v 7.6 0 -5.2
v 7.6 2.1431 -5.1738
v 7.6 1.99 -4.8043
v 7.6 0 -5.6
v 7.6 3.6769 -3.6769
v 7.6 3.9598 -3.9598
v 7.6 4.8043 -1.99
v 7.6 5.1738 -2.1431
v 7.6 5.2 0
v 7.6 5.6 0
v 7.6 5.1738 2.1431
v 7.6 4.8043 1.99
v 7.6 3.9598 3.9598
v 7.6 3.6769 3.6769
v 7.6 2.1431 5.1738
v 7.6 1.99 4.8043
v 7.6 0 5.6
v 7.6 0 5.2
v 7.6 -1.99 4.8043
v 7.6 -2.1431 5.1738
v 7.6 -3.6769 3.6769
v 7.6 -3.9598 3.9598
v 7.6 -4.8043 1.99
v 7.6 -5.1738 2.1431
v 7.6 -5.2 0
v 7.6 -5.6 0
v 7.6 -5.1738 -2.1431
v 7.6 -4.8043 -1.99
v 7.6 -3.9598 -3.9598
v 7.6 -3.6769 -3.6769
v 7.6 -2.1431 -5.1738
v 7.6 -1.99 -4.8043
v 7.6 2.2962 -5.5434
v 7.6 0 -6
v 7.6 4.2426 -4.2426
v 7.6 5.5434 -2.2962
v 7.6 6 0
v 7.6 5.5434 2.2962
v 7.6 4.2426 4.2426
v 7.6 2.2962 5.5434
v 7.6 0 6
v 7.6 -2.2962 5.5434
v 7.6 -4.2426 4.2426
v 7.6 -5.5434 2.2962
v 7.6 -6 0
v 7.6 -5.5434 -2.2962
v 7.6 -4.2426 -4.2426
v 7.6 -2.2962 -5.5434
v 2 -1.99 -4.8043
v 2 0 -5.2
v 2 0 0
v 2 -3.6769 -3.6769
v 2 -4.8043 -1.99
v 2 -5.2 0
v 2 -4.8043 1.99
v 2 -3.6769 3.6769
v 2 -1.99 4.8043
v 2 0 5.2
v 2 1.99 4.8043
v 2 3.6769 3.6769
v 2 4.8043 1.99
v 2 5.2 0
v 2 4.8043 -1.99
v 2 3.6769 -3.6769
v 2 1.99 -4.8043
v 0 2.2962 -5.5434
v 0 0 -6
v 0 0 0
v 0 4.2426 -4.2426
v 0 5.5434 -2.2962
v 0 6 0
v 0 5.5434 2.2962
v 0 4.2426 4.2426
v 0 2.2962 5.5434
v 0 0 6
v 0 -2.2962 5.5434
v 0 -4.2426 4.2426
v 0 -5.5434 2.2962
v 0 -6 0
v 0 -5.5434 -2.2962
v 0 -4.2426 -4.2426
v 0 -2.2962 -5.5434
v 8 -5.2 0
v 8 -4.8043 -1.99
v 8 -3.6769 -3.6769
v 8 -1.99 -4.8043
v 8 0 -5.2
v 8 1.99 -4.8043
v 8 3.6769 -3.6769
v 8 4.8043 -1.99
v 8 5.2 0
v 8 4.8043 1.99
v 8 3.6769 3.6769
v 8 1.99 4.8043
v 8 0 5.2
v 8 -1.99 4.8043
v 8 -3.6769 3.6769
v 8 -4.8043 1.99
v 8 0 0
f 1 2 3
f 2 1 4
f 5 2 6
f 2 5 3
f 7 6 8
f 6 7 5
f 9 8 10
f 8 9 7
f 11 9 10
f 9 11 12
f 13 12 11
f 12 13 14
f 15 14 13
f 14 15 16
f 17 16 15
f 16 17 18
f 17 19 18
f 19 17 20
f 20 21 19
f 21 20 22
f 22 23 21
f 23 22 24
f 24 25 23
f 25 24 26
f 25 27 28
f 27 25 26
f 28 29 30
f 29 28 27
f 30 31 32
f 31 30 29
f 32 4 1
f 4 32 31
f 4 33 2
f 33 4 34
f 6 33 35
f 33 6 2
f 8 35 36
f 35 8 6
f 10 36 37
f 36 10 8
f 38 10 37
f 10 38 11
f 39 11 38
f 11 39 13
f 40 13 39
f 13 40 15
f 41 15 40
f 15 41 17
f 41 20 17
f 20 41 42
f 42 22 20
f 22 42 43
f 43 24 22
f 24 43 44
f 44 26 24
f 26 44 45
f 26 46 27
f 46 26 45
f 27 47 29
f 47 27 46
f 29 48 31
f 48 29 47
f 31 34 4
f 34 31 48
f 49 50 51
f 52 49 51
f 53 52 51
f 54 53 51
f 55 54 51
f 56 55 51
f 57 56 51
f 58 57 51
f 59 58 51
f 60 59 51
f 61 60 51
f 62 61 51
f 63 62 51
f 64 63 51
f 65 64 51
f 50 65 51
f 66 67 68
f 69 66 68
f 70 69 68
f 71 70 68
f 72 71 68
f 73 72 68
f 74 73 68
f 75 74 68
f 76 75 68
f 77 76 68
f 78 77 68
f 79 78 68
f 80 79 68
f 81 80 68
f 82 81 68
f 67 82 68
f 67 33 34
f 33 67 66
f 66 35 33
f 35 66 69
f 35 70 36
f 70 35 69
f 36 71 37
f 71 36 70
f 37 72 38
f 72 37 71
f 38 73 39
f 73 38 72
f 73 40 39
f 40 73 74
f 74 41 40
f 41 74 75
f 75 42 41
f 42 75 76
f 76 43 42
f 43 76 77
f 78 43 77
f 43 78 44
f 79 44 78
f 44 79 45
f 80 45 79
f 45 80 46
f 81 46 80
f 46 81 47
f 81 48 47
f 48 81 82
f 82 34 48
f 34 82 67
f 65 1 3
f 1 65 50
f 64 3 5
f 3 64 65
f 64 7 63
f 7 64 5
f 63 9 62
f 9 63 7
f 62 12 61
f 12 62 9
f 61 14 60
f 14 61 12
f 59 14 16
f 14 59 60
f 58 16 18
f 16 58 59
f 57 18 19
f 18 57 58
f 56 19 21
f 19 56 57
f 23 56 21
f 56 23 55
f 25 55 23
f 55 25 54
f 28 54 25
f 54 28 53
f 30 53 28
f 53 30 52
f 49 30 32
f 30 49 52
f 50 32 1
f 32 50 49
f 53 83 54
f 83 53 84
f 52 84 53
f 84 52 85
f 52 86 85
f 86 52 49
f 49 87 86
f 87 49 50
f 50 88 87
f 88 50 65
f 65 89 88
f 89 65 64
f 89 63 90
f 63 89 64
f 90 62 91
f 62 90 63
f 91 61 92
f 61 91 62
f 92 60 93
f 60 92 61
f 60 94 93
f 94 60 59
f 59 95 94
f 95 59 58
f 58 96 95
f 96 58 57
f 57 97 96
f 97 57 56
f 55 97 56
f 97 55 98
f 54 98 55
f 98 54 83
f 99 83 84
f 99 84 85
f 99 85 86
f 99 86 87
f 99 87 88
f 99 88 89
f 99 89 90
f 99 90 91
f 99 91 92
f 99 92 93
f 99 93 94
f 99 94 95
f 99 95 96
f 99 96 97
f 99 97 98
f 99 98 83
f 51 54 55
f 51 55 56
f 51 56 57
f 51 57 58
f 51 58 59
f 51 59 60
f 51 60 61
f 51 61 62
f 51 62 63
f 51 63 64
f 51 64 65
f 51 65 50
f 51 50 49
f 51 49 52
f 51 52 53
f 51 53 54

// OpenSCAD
// file: ../u9044.scad
use <../lib.scad>
use <../p/4-4cyli.scad>
use <../p/4-4disc.scad>
use <../p/4-4edge.scad>
function ldraw_lib__u9044() = [
// 0 ~Magnet Cylindrical  1.3 x  1.3
// 0 Name: u9044.dat
// 0 Author: Chris Dee [cwdee]
// 0 !LDRAW_ORG Part UPDATE 2012-01
// 0 !LICENSE Licensed under CC BY 2.0 and CC BY 4.0 : see CAreadme.txt
// 
// 0 BFC CERTIFY CW
  [0,"BFC","CERTIFY"],
  [0,"BFC","CW"],
// 
// 0 !CMDLINE -c493
// 
// 0 !HISTORY 2011-12-18 [Steffen] added cmdline for new magnet material 493
// 0 !HISTORY 2012-03-30 [PTadmin] Official Update 2012-01
// 
// 
// 1 16 0 0 -7.5 13 0 0 0 0 13 0 15 0 4-4cyli.dat
  [1,16,0,0,-7.5,13,0,0,0,0,13,0,15,0, ldraw_lib__4_4cyli()],
// 1 16 0 0 7.5 13 0 0 0 0 13 0 1 0 4-4edge.dat
  [1,16,0,0,7.5,13,0,0,0,0,13,0,1,0, ldraw_lib__4_4edge()],
// 1 16 0 0 7.5 13 0 0 0 0 13 0 -1 0 4-4disc.dat
  [1,16,0,0,7.5,13,0,0,0,0,13,0,-1,0, ldraw_lib__4_4disc()],
// 1 16 0 0 -7.5 13 0 0 0 0 -13 0 1 0 4-4edge.dat
  [1,16,0,0,-7.5,13,0,0,0,0,-13,0,1,0, ldraw_lib__4_4edge()],
// 1 16 0 0 -7.5 13 0 0 0 0 -13 0 1 0 4-4disc.dat
  [1,16,0,0,-7.5,13,0,0,0,0,-13,0,1,0, ldraw_lib__4_4disc()],
];
makepoly(ldraw_lib__u9044(), line=0.2);
// file: ../../p/4-4rin14.scad
use <../lib.scad>
function ldraw_lib__4_4rin14() = [
// 0 Ring 14 x 1.0
// 0 Name: 4-4rin14.dat
// 0 Author: John Riley [jriley]
// 0 !LDRAW_ORG Primitive UPDATE 2003-03
// 0 !LICENSE Licensed under CC BY 2.0 and CC BY 4.0 : see CAreadme.txt
// 
// 0 BFC CERTIFY CCW
  [0,"BFC","CERTIFY"],
  [0,"BFC","CCW"],
// 
// 0 !HISTORY 2003-12-19 [PTadmin] Official Update 2003-03
// 0 !HISTORY 2007-06-24 [PTadmin] Header formatted for Contributor Agreement
// 0 !HISTORY 2008-07-01 [PTadmin] Official Update 2008-01
// 
// 
// 4 16 14 0 0 15 0 0 13.8585 0 5.7405 12.9346 0 5.3578
  [4,16,14,0,0,15,0,0,13.8585,0,5.7405,12.9346,0,5.3578],
// 4 16 12.9346 0 5.3578 13.8585 0 5.7405 10.6065 0 10.6065 9.8994 0 9.8994
  [4,16,12.9346,0,5.3578,13.8585,0,5.7405,10.6065,0,10.6065,9.8994,0,9.8994],
// 4 16 9.8994 0 9.8994 10.6065 0 10.6065 5.7405 0 13.8585 5.3578 0 12.9346
  [4,16,9.8994,0,9.8994,10.6065,0,10.6065,5.7405,0,13.8585,5.3578,0,12.9346],
// 4 16 5.3578 0 12.9346 5.7405 0 13.8585 0 0 15 0 0 14
  [4,16,5.3578,0,12.9346,5.7405,0,13.8585,0,0,15,0,0,14],
// 4 16 0 0 14 0 0 15 -5.7405 0 13.8585 -5.3578 0 12.9346
  [4,16,0,0,14,0,0,15,-5.7405,0,13.8585,-5.3578,0,12.9346],
// 4 16 -5.3578 0 12.9346 -5.7405 0 13.8585 -10.6065 0 10.6065 -9.8994 0 9.8994
  [4,16,-5.3578,0,12.9346,-5.7405,0,13.8585,-10.6065,0,10.6065,-9.8994,0,9.8994],
// 4 16 -9.8994 0 9.8994 -10.6065 0 10.6065 -13.8585 0 5.7405 -12.9346 0 5.3578
  [4,16,-9.8994,0,9.8994,-10.6065,0,10.6065,-13.8585,0,5.7405,-12.9346,0,5.3578],
// 4 16 -12.9346 0 5.3578 -13.8585 0 5.7405 -15 0 0 -14 0 0
  [4,16,-12.9346,0,5.3578,-13.8585,0,5.7405,-15,0,0,-14,0,0],
// 4 16 -14 0 0 -15 0 0 -13.8585 0 -5.7405 -12.9346 0 -5.3578
  [4,16,-14,0,0,-15,0,0,-13.8585,0,-5.7405,-12.9346,0,-5.3578],
// 4 16 -12.9346 0 -5.3578 -13.8585 0 -5.7405 -10.6065 0 -10.6065 -9.8994 0 -9.8994
  [4,16,-12.9346,0,-5.3578,-13.8585,0,-5.7405,-10.6065,0,-10.6065,-9.8994,0,-9.8994],
// 4 16 -9.8994 0 -9.8994 -10.6065 0 -10.6065 -5.7405 0 -13.8585 -5.3578 0 -12.9346
  [4,16,-9.8994,0,-9.8994,-10.6065,0,-10.6065,-5.7405,0,-13.8585,-5.3578,0,-12.9346],
// 4 16 -5.3578 0 -12.9346 -5.7405 0 -13.8585 0 0 -15 0 0 -14
  [4,16,-5.3578,0,-12.9346,-5.7405,0,-13.8585,0,0,-15,0,0,-14],
// 4 16 0 0 -14 0 0 -15 5.7405 0 -13.8585 5.3578 0 -12.9346
  [4,16,0,0,-14,0,0,-15,5.7405,0,-13.8585,5.3578,0,-12.9346],
// 4 16 5.3578 0 -12.9346 5.7405 0 -13.8585 10.6065 0 -10.6065 9.8994 0 -9.8994
  [4,16,5.3578,0,-12.9346,5.7405,0,-13.8585,10.6065,0,-10.6065,9.8994,0,-9.8994],
// 4 16 9.8994 0 -9.8994 10.6065 0 -10.6065 13.8585 0 -5.7405 12.9346 0 -5.3578
  [4,16,9.8994,0,-9.8994,10.6065,0,-10.6065,13.8585,0,-5.7405,12.9346,0,-5.3578],
// 4 16 12.9346 0 -5.3578 13.8585 0 -5.7405 15 0 0 14 0 0
  [4,16,12.9346,0,-5.3578,13.8585,0,-5.7405,15,0,0,14,0,0],
// 0
// 
];
makepoly(ldraw_lib__4_4rin14(), line=0.2);
// file: ../../p/4-4rin13.scad
use <../lib.scad>
function ldraw_lib__4_4rin13() = [
// 0 Ring 13 x 1.0
// 0 Name: 4-4rin13.dat
// 0 Author: John Riley [jriley]
// 0 !LDRAW_ORG Primitive UPDATE 2003-03
// 0 !LICENSE Licensed under CC BY 2.0 and CC BY 4.0 : see CAreadme.txt
// 
// 0 BFC CERTIFY CCW
  [0,"BFC","CERTIFY"],
  [0,"BFC","CCW"],
// 
// 0 !HISTORY 2003-12-19 [PTadmin] Official Update 2003-03
// 0 !HISTORY 2007-06-24 [PTadmin] Header formatted for Contributor Agreement
// 0 !HISTORY 2008-07-01 [PTadmin] Official Update 2008-01
// 
// 
// 4 16 13 0 0 14 0 0 12.9346 0 5.3578 12.0107 0 4.9751
  [4,16,13,0,0,14,0,0,12.9346,0,5.3578,12.0107,0,4.9751],
// 4 16 12.0107 0 4.9751 12.9346 0 5.3578 9.8994 0 9.8994 9.1923 0 9.1923
  [4,16,12.0107,0,4.9751,12.9346,0,5.3578,9.8994,0,9.8994,9.1923,0,9.1923],
// 4 16 9.1923 0 9.1923 9.8994 0 9.8994 5.3578 0 12.9346 4.9751 0 12.0107
  [4,16,9.1923,0,9.1923,9.8994,0,9.8994,5.3578,0,12.9346,4.9751,0,12.0107],
// 4 16 4.9751 0 12.0107 5.3578 0 12.9346 0 0 14 0 0 13
  [4,16,4.9751,0,12.0107,5.3578,0,12.9346,0,0,14,0,0,13],
// 4 16 0 0 13 0 0 14 -5.3578 0 12.9346 -4.9751 0 12.0107
  [4,16,0,0,13,0,0,14,-5.3578,0,12.9346,-4.9751,0,12.0107],
// 4 16 -4.9751 0 12.0107 -5.3578 0 12.9346 -9.8994 0 9.8994 -9.1923 0 9.1923
  [4,16,-4.9751,0,12.0107,-5.3578,0,12.9346,-9.8994,0,9.8994,-9.1923,0,9.1923],
// 4 16 -9.1923 0 9.1923 -9.8994 0 9.8994 -12.9346 0 5.3578 -12.0107 0 4.9751
  [4,16,-9.1923,0,9.1923,-9.8994,0,9.8994,-12.9346,0,5.3578,-12.0107,0,4.9751],
// 4 16 -12.0107 0 4.9751 -12.9346 0 5.3578 -14 0 0 -13 0 0
  [4,16,-12.0107,0,4.9751,-12.9346,0,5.3578,-14,0,0,-13,0,0],
// 4 16 -13 0 0 -14 0 0 -12.9346 0 -5.3578 -12.0107 0 -4.9751
  [4,16,-13,0,0,-14,0,0,-12.9346,0,-5.3578,-12.0107,0,-4.9751],
// 4 16 -12.0107 0 -4.9751 -12.9346 0 -5.3578 -9.8994 0 -9.8994 -9.1923 0 -9.1923
  [4,16,-12.0107,0,-4.9751,-12.9346,0,-5.3578,-9.8994,0,-9.8994,-9.1923,0,-9.1923],
// 4 16 -9.1923 0 -9.1923 -9.8994 0 -9.8994 -5.3578 0 -12.9346 -4.9751 0 -12.0107
  [4,16,-9.1923,0,-9.1923,-9.8994,0,-9.8994,-5.3578,0,-12.9346,-4.9751,0,-12.0107],
// 4 16 -4.9751 0 -12.0107 -5.3578 0 -12.9346 0 0 -14 0 0 -13
  [4,16,-4.9751,0,-12.0107,-5.3578,0,-12.9346,0,0,-14,0,0,-13],
// 4 16 0 0 -13 0 0 -14 5.3578 0 -12.9346 4.9751 0 -12.0107
  [4,16,0,0,-13,0,0,-14,5.3578,0,-12.9346,4.9751,0,-12.0107],
// 4 16 4.9751 0 -12.0107 5.3578 0 -12.9346 9.8994 0 -9.8994 9.1923 0 -9.1923
  [4,16,4.9751,0,-12.0107,5.3578,0,-12.9346,9.8994,0,-9.8994,9.1923,0,-9.1923],
// 4 16 9.1923 0 -9.1923 9.8994 0 -9.8994 12.9346 0 -5.3578 12.0107 0 -4.9751
  [4,16,9.1923,0,-9.1923,9.8994,0,-9.8994,12.9346,0,-5.3578,12.0107,0,-4.9751],
// 4 16 12.0107 0 -4.9751 12.9346 0 -5.3578 14 0 0 13 0 0
  [4,16,12.0107,0,-4.9751,12.9346,0,-5.3578,14,0,0,13,0,0],
// 0
// 
];
makepoly(ldraw_lib__4_4rin13(), line=0.2);
// file: ../../p/4-4edge.scad
use <../lib.scad>
function ldraw_lib__4_4edge() = [
// 0 Circle 1.0
// 0 Name: 4-4edge.dat
// 0 Author: James Jessiman
// 0 !LDRAW_ORG Primitive UPDATE 2017-01
// 0 !LICENSE Licensed under CC BY 2.0 and CC BY 4.0 : see CAreadme.txt
// 
// 0 BFC CERTIFY CCW
  [0,"BFC","CERTIFY"],
  [0,"BFC","CCW"],
// 
// 0 !HISTORY 1998-12-15 [PTadmin] Official Update 1998-10
// 0 !HISTORY 2005-12-28 [PTadmin] Official Update 2005-01
// 0 !HISTORY 2007-06-24 [PTadmin] Header formatted for Contributor Agreement
// 0 !HISTORY 2008-07-01 [PTadmin] Official Update 2008-01
// 0 !HISTORY 2017-01-15 [Steffen] BFCed
// 0 !HISTORY 2017-12-30 [PTadmin] Official Update 2017-01
// 
// 
// 2 24 1 0 0 0.9239 0 0.3827
  [2,24,1,0,0,0.9239,0,0.3827],
// 2 24 0.9239 0 0.3827 0.7071 0 0.7071
  [2,24,0.9239,0,0.3827,0.7071,0,0.7071],
// 2 24 0.7071 0 0.7071 0.3827 0 0.9239
  [2,24,0.7071,0,0.7071,0.3827,0,0.9239],
// 2 24 0.3827 0 0.9239 0 0 1
  [2,24,0.3827,0,0.9239,0,0,1],
// 2 24 0 0 1 -0.3827 0 0.9239
  [2,24,0,0,1,-0.3827,0,0.9239],
// 2 24 -0.3827 0 0.9239 -0.7071 0 0.7071
  [2,24,-0.3827,0,0.9239,-0.7071,0,0.7071],
// 2 24 -0.7071 0 0.7071 -0.9239 0 0.3827
  [2,24,-0.7071,0,0.7071,-0.9239,0,0.3827],
// 2 24 -0.9239 0 0.3827 -1 0 -0
  [2,24,-0.9239,0,0.3827,-1,0,-0],
// 2 24 -1 0 -0 -0.9239 0 -0.3827
  [2,24,-1,0,-0,-0.9239,0,-0.3827],
// 2 24 -0.9239 0 -0.3827 -0.7071 0 -0.7071
  [2,24,-0.9239,0,-0.3827,-0.7071,0,-0.7071],
// 2 24 -0.7071 0 -0.7071 -0.3827 0 -0.9239
  [2,24,-0.7071,0,-0.7071,-0.3827,0,-0.9239],
// 2 24 -0.3827 0 -0.9239 0 0 -1
  [2,24,-0.3827,0,-0.9239,0,0,-1],
// 2 24 0 0 -1 0.3827 0 -0.9239
  [2,24,0,0,-1,0.3827,0,-0.9239],
// 2 24 0.3827 0 -0.9239 0.7071 0 -0.7071
  [2,24,0.3827,0,-0.9239,0.7071,0,-0.7071],
// 2 24 0.7071 0 -0.7071 0.9239 0 -0.3827
  [2,24,0.7071,0,-0.7071,0.9239,0,-0.3827],
// 2 24 0.9239 0 -0.3827 1 0 0
  [2,24,0.9239,0,-0.3827,1,0,0],
];
makepoly(ldraw_lib__4_4edge(), line=0.2);
// file: ../../p/4-4disc.scad
use <../lib.scad>
function ldraw_lib__4_4disc() = [
// 0 Disc 1.0
// 0 Name: 4-4disc.dat
// 0 Author: James Jessiman
// 0 !LDRAW_ORG Primitive UPDATE 2002-02
// 0 !LICENSE Licensed under CC BY 2.0 and CC BY 4.0 : see CAreadme.txt
// 
// 0 BFC CERTIFY CCW
  [0,"BFC","CERTIFY"],
  [0,"BFC","CCW"],
// 
// 0 !HISTORY 1998-12-15 [PTadmin] Official Update 1998-10
// 0 !HISTORY 2002-03-23 [sbliss] Added BFC statement
// 0 !HISTORY 2002-04-25 [PTadmin] Official Update 2002-02
// 0 !HISTORY 2007-06-24 [PTadmin] Header formatted for Contributor Agreement
// 0 !HISTORY 2008-07-01 [PTadmin] Official Update 2008-01
// 
// 
// 3 16 0 0 0 1 0 0 0.9239 0 0.3827
  [3,16,0,0,0,1,0,0,0.9239,0,0.3827],
// 3 16 0 0 0 0.9239 0 0.3827 0.7071 0 0.7071
  [3,16,0,0,0,0.9239,0,0.3827,0.7071,0,0.7071],
// 3 16 0 0 0 0.7071 0 0.7071 0.3827 0 0.9239
  [3,16,0,0,0,0.7071,0,0.7071,0.3827,0,0.9239],
// 3 16 0 0 0 0.3827 0 0.9239 0 0 1
  [3,16,0,0,0,0.3827,0,0.9239,0,0,1],
// 3 16 0 0 0 0 0 1 -0.3827 0 0.9239
  [3,16,0,0,0,0,0,1,-0.3827,0,0.9239],
// 3 16 0 0 0 -0.3827 0 0.9239 -0.7071 0 0.7071
  [3,16,0,0,0,-0.3827,0,0.9239,-0.7071,0,0.7071],
// 3 16 0 0 0 -0.7071 0 0.7071 -0.9239 0 0.3827
  [3,16,0,0,0,-0.7071,0,0.7071,-0.9239,0,0.3827],
// 3 16 0 0 0 -0.9239 0 0.3827 -1 0 -0
  [3,16,0,0,0,-0.9239,0,0.3827,-1,0,-0],
// 3 16 0 0 0 -1 0 -0 -0.9239 0 -0.3827
  [3,16,0,0,0,-1,0,-0,-0.9239,0,-0.3827],
// 3 16 0 0 0 -0.9239 0 -0.3827 -0.7071 0 -0.7071
  [3,16,0,0,0,-0.9239,0,-0.3827,-0.7071,0,-0.7071],
// 3 16 0 0 0 -0.7071 0 -0.7071 -0.3827 0 -0.9239
  [3,16,0,0,0,-0.7071,0,-0.7071,-0.3827,0,-0.9239],
// 3 16 0 0 0 -0.3827 0 -0.9239 0 0 -1
  [3,16,0,0,0,-0.3827,0,-0.9239,0,0,-1],
// 3 16 0 0 0 0 0 -1 0.3827 0 -0.9239
  [3,16,0,0,0,0,0,-1,0.3827,0,-0.9239],
// 3 16 0 0 0 0.3827 0 -0.9239 0.7071 0 -0.7071
  [3,16,0,0,0,0.3827,0,-0.9239,0.7071,0,-0.7071],
// 3 16 0 0 0 0.7071 0 -0.7071 0.9239 0 -0.3827
  [3,16,0,0,0,0.7071,0,-0.7071,0.9239,0,-0.3827],
// 3 16 0 0 0 0.9239 0 -0.3827 1 0 0
  [3,16,0,0,0,0.9239,0,-0.3827,1,0,0],
// 0
];
makepoly(ldraw_lib__4_4disc(), line=0.2);
// file: ../../p/4-4cyli.scad
use <../lib.scad>
function ldraw_lib__4_4cyli() = [
// 0 Cylinder 1.0
// 0 Name: 4-4cyli.dat
// 0 Author: James Jessiman
// 0 !LDRAW_ORG Primitive UPDATE 2005-01
// 0 !LICENSE Licensed under CC BY 2.0 and CC BY 4.0 : see CAreadme.txt
// 
// 0 BFC CERTIFY CCW
  [0,"BFC","CERTIFY"],
  [0,"BFC","CCW"],
// 
// 0 !HISTORY 1998-12-15 [PTadmin] Official Update 1998-10
// 0 !HISTORY 2002-03-23 [sbliss] Added BFC statement; merged headers from files in distributions LDraw 0.27 and Complete.
// 0 !HISTORY 2002-04-25 [PTadmin] Official Update 2002-02
// 0 !HISTORY 2004-12-14 [guyvivan] BFC CCW
// 0 !HISTORY 2005-12-28 [PTadmin] Official Update 2005-01
// 0 !HISTORY 2007-06-24 [PTadmin] Header formatted for Contributor Agreement
// 0 !HISTORY 2008-07-01 [PTadmin] Official Update 2008-01
// 
// 
// 4 16 1 1 0 0.9239 1 0.3827 0.9239 0 0.3827 1 0 0
  [4,16,1,1,0,0.9239,1,0.3827,0.9239,0,0.3827,1,0,0],
// 5 24 1 0 0 1 1 0 0.9239 0 0.3827 0.9239 0 -0.3827
  [5,24,1,0,0,1,1,0,0.9239,0,0.3827,0.9239,0,-0.3827],
// 4 16 0.9239 1 0.3827 0.7071 1 0.7071 0.7071 0 0.7071 0.9239 0 0.3827
  [4,16,0.9239,1,0.3827,0.7071,1,0.7071,0.7071,0,0.7071,0.9239,0,0.3827],
// 5 24 0.9239 0 0.3827 0.9239 1 0.3827 0.7071 0 0.7071 1 0 0
  [5,24,0.9239,0,0.3827,0.9239,1,0.3827,0.7071,0,0.7071,1,0,0],
// 4 16 0.7071 1 0.7071 0.3827 1 0.9239 0.3827 0 0.9239 0.7071 0 0.7071
  [4,16,0.7071,1,0.7071,0.3827,1,0.9239,0.3827,0,0.9239,0.7071,0,0.7071],
// 5 24 0.7071 0 0.7071 0.7071 1 0.7071 0.3827 0 0.9239 0.9239 0 0.3827
  [5,24,0.7071,0,0.7071,0.7071,1,0.7071,0.3827,0,0.9239,0.9239,0,0.3827],
// 4 16 0.3827 1 0.9239 0 1 1 0 0 1 0.3827 0 0.9239
  [4,16,0.3827,1,0.9239,0,1,1,0,0,1,0.3827,0,0.9239],
// 5 24 0.3827 0 0.9239 0.3827 1 0.9239 0 0 1 0.7071 0 0.7071
  [5,24,0.3827,0,0.9239,0.3827,1,0.9239,0,0,1,0.7071,0,0.7071],
// 4 16 0 1 1 -0.3827 1 0.9239 -0.3827 0 0.9239 0 0 1
  [4,16,0,1,1,-0.3827,1,0.9239,-0.3827,0,0.9239,0,0,1],
// 5 24 0 0 1 0 1 1 -0.3827 0 0.9239 0.3827 0 0.9239
  [5,24,0,0,1,0,1,1,-0.3827,0,0.9239,0.3827,0,0.9239],
// 4 16 -0.3827 1 0.9239 -0.7071 1 0.7071 -0.7071 0 0.7071 -0.3827 0 0.9239
  [4,16,-0.3827,1,0.9239,-0.7071,1,0.7071,-0.7071,0,0.7071,-0.3827,0,0.9239],
// 5 24 -0.3827 0 0.9239 -0.3827 1 0.9239 -0.7071 0 0.7071 0 0 1
  [5,24,-0.3827,0,0.9239,-0.3827,1,0.9239,-0.7071,0,0.7071,0,0,1],
// 4 16 -0.7071 1 0.7071 -0.9239 1 0.3827 -0.9239 0 0.3827 -0.7071 0 0.7071
  [4,16,-0.7071,1,0.7071,-0.9239,1,0.3827,-0.9239,0,0.3827,-0.7071,0,0.7071],
// 5 24 -0.7071 0 0.7071 -0.7071 1 0.7071 -0.9239 0 0.3827 -0.3827 0 0.9239
  [5,24,-0.7071,0,0.7071,-0.7071,1,0.7071,-0.9239,0,0.3827,-0.3827,0,0.9239],
// 4 16 -0.9239 1 0.3827 -1 1 0 -1 0 0 -0.9239 0 0.3827
  [4,16,-0.9239,1,0.3827,-1,1,0,-1,0,0,-0.9239,0,0.3827],
// 5 24 -0.9239 0 0.3827 -0.9239 1 0.3827 -1 0 0 -0.7071 0 0.7071
  [5,24,-0.9239,0,0.3827,-0.9239,1,0.3827,-1,0,0,-0.7071,0,0.7071],
// 4 16 -1 1 0 -0.9239 1 -0.3827 -0.9239 0 -0.3827 -1 0 0
  [4,16,-1,1,0,-0.9239,1,-0.3827,-0.9239,0,-0.3827,-1,0,0],
// 5 24 -1 0 0 -1 1 0 -0.9239 0 -0.3827 -0.9239 0 0.3827
  [5,24,-1,0,0,-1,1,0,-0.9239,0,-0.3827,-0.9239,0,0.3827],
// 4 16 -0.9239 1 -0.3827 -0.7071 1 -0.7071 -0.7071 0 -0.7071 -0.9239 0 -0.3827
  [4,16,-0.9239,1,-0.3827,-0.7071,1,-0.7071,-0.7071,0,-0.7071,-0.9239,0,-0.3827],
// 5 24 -0.9239 0 -0.3827 -0.9239 1 -0.3827 -0.7071 0 -0.7071 -1 0 0
  [5,24,-0.9239,0,-0.3827,-0.9239,1,-0.3827,-0.7071,0,-0.7071,-1,0,0],
// 4 16 -0.7071 1 -0.7071 -0.3827 1 -0.9239 -0.3827 0 -0.9239 -0.7071 0 -0.7071
  [4,16,-0.7071,1,-0.7071,-0.3827,1,-0.9239,-0.3827,0,-0.9239,-0.7071,0,-0.7071],
// 5 24 -0.7071 0 -0.7071 -0.7071 1 -0.7071 -0.3827 0 -0.9239 -0.9239 0 -0.3827
  [5,24,-0.7071,0,-0.7071,-0.7071,1,-0.7071,-0.3827,0,-0.9239,-0.9239,0,-0.3827],
// 4 16 -0.3827 1 -0.9239 0 1 -1 0 0 -1 -0.3827 0 -0.9239
  [4,16,-0.3827,1,-0.9239,0,1,-1,0,0,-1,-0.3827,0,-0.9239],
// 5 24 -0.3827 0 -0.9239 -0.3827 1 -0.9239 0 0 -1 -0.7071 0 -0.7071
  [5,24,-0.3827,0,-0.9239,-0.3827,1,-0.9239,0,0,-1,-0.7071,0,-0.7071],
// 4 16 0 1 -1 0.3827 1 -0.9239 0.3827 0 -0.9239 0 0 -1
  [4,16,0,1,-1,0.3827,1,-0.9239,0.3827,0,-0.9239,0,0,-1],
// 5 24 0 0 -1 0 1 -1 0.3827 0 -0.9239 -0.3827 0 -0.9239
  [5,24,0,0,-1,0,1,-1,0.3827,0,-0.9239,-0.3827,0,-0.9239],
// 4 16 0.3827 1 -0.9239 0.7071 1 -0.7071 0.7071 0 -0.7071 0.3827 0 -0.9239
  [4,16,0.3827,1,-0.9239,0.7071,1,-0.7071,0.7071,0,-0.7071,0.3827,0,-0.9239],
// 5 24 0.3827 0 -0.9239 0.3827 1 -0.9239 0.7071 0 -0.7071 0 0 -1
  [5,24,0.3827,0,-0.9239,0.3827,1,-0.9239,0.7071,0,-0.7071,0,0,-1],
// 4 16 0.7071 1 -0.7071 0.9239 1 -0.3827 0.9239 0 -0.3827 0.7071 0 -0.7071
  [4,16,0.7071,1,-0.7071,0.9239,1,-0.3827,0.9239,0,-0.3827,0.7071,0,-0.7071],
// 5 24 0.7071 0 -0.7071 0.7071 1 -0.7071 0.9239 0 -0.3827 0.3827 0 -0.9239
  [5,24,0.7071,0,-0.7071,0.7071,1,-0.7071,0.9239,0,-0.3827,0.3827,0,-0.9239],
// 4 16 0.9239 1 -0.3827 1 1 0 1 0 0 0.9239 0 -0.3827
  [4,16,0.9239,1,-0.3827,1,1,0,1,0,0,0.9239,0,-0.3827],
// 5 24 0.9239 0 -0.3827 0.9239 1 -0.3827 1 0 0 0.7071 0 -0.7071
  [5,24,0.9239,0,-0.3827,0.9239,1,-0.3827,1,0,0,0.7071,0,-0.7071],
// 0
];
makepoly(ldraw_lib__4_4cyli(), line=0.2);
// main file
use <../../lib.scad>
use <../../p/4-4cyli.scad>
use <../../p/4-4disc.scad>
use <../../p/4-4edge.scad>
use <../../p/4-4rin13.scad>
use <../../p/4-4rin14.scad>
use <../u9044.scad>
function ldraw_lib__s__735s01() = [
// 0 ~Magnet Holder (Needs Work)
// 0 Name: s\735s01.dat
// 0 Author: Tore Eriksson [Tore_Eriksson]
// 0 !LDRAW_ORG Subpart UPDATE 2012-01
// 0 !LICENSE Licensed under CC BY 2.0 and CC BY 4.0 : see CAreadme.txt
// 
// 0 BFC CERTIFY CCW
  [0,"BFC","CERTIFY"],
  [0,"BFC","CCW"],
// 
// 0 !HISTORY 1999-12-31 [PTadmin] Official Update 1999-06
// 0 !HISTORY 2007-09-14 [PTadmin] Header formatted for Contributor Agreement
// 0 !HISTORY 2008-07-01 [PTadmin] Official Update 2008-01
// 0 !HISTORY 2008-07-07 [nielsk] BFC certified; ring6 fixed; size corrected
// 0 !HISTORY 2008-07-08 [PTadmin] Renamed from magnet
// 0 !HISTORY 2009-05-02 [PTadmin] Official Update 2009-01
// 0 !HISTORY 2011-12-18 [Steffen] added missing inside; used u9044.dat; used new magnet material 493; added needs work note
// 0 !HISTORY 2012-03-30 [PTadmin] Official Update 2012-01
// 
// 
// 0 // Needs Work: The parent files of this file need restructurization analogous
// 0 // to 499c01.dat, as currently the magnet is directly contained
// 0 // in this subfile, which does not conform with our parts/subparts
// 0 // /shortcuts logic.
// 
// 1 16 0 0 0 0 1 0 15 0 0 0 0 15 4-4edge.dat
  [1,16,0,0,0,0,1,0,15,0,0,0,0,15, ldraw_lib__4_4edge()],
// 1 16 19 0 0 0 1 0 15 0 0 0 0 15 4-4edge.dat
  [1,16,19,0,0,0,1,0,15,0,0,0,0,15, ldraw_lib__4_4edge()],
// 1 16 19 0 0 0 -1 0 1 0 0 0 0 1 4-4rin13.dat
  [1,16,19,0,0,0,-1,0,1,0,0,0,0,1, ldraw_lib__4_4rin13()],
// 1 16 19 0 0 0 -1 0 1 0 0 0 0 1 4-4rin14.dat
  [1,16,19,0,0,0,-1,0,1,0,0,0,0,1, ldraw_lib__4_4rin14()],
// 1 16 5 0 0 0 -1 0 13 0 0 0 0 -13 4-4disc.dat
  [1,16,5,0,0,0,-1,0,13,0,0,0,0,-13, ldraw_lib__4_4disc()],
// 1 16 0 0 0 0 1 0 15 0 0 0 0 15 4-4disc.dat
  [1,16,0,0,0,0,1,0,15,0,0,0,0,15, ldraw_lib__4_4disc()],
// 1 16 0 0 0 0 19 0 15 0 0 0 0 15 4-4cyli.dat
  [1,16,0,0,0,0,19,0,15,0,0,0,0,15, ldraw_lib__4_4cyli()],
// 1 16 19 0 0 0 1 0 13 0 0 0 0 13 4-4edge.dat
  [1,16,19,0,0,0,1,0,13,0,0,0,0,13, ldraw_lib__4_4edge()],
// 1 16 5 0 0 0 1 0 13 0 0 0 0 13 4-4edge.dat
  [1,16,5,0,0,0,1,0,13,0,0,0,0,13, ldraw_lib__4_4edge()],
// 0 BFC INVERTNEXT
  [0,"BFC","INVERTNEXT"],
// 1 16 5 0 0 0 14 0 13 0 0 0 0 13 4-4cyli.dat
  [1,16,5,0,0,0,14,0,13,0,0,0,0,13, ldraw_lib__4_4cyli()],
// 1 493 12.5 0 0 0 0 1 0 1 0 -1 0 0 u9044.dat
  [1,493,12.5,0,0,0,0,1,0,1,0,-1,0,0, ldraw_lib__u9044()],
];
makepoly(ldraw_lib__s__735s01(), line=0.2);
